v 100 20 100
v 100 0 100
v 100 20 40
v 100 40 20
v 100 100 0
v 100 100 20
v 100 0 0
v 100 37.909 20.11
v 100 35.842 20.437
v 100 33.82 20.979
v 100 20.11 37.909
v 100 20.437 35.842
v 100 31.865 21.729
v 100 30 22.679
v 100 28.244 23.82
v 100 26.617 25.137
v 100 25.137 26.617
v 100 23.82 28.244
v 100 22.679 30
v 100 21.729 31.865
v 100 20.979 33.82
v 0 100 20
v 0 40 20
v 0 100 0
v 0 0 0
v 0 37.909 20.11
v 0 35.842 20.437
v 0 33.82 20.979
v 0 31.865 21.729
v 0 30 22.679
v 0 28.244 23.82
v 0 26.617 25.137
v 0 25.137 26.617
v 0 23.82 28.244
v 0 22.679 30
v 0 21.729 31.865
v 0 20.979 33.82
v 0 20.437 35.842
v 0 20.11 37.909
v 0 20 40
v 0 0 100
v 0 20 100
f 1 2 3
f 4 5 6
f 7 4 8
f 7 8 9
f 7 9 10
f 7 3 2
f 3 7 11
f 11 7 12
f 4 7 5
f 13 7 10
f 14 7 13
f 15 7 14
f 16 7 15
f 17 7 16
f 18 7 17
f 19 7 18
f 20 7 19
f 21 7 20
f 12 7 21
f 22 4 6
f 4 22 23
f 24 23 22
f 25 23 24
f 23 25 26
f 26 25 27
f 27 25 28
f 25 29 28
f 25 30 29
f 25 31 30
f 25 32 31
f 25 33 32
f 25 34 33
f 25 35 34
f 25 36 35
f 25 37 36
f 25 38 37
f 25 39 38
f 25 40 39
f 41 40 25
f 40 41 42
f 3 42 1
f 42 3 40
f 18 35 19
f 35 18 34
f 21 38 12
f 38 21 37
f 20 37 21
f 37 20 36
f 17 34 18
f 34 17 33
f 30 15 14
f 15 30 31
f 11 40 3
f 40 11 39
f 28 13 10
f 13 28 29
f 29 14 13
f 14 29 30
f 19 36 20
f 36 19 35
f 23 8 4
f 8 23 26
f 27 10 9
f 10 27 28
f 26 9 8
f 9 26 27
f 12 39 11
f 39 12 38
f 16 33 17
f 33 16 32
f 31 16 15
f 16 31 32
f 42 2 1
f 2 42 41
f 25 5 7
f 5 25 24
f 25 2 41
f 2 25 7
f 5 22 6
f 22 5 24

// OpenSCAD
union() {
    cube([100,20,100]);
    cube([100,100,20]);

    translate([0,20,20]) fillet(100,20);
}

module fillet(length =100, radius = 50){
    difference() {
        cube([length,radius,radius]);
        translate([0,radius,radius])rotate([0,90,0])cylinder(h=length,r=radius,$fn=60);
    }
}
